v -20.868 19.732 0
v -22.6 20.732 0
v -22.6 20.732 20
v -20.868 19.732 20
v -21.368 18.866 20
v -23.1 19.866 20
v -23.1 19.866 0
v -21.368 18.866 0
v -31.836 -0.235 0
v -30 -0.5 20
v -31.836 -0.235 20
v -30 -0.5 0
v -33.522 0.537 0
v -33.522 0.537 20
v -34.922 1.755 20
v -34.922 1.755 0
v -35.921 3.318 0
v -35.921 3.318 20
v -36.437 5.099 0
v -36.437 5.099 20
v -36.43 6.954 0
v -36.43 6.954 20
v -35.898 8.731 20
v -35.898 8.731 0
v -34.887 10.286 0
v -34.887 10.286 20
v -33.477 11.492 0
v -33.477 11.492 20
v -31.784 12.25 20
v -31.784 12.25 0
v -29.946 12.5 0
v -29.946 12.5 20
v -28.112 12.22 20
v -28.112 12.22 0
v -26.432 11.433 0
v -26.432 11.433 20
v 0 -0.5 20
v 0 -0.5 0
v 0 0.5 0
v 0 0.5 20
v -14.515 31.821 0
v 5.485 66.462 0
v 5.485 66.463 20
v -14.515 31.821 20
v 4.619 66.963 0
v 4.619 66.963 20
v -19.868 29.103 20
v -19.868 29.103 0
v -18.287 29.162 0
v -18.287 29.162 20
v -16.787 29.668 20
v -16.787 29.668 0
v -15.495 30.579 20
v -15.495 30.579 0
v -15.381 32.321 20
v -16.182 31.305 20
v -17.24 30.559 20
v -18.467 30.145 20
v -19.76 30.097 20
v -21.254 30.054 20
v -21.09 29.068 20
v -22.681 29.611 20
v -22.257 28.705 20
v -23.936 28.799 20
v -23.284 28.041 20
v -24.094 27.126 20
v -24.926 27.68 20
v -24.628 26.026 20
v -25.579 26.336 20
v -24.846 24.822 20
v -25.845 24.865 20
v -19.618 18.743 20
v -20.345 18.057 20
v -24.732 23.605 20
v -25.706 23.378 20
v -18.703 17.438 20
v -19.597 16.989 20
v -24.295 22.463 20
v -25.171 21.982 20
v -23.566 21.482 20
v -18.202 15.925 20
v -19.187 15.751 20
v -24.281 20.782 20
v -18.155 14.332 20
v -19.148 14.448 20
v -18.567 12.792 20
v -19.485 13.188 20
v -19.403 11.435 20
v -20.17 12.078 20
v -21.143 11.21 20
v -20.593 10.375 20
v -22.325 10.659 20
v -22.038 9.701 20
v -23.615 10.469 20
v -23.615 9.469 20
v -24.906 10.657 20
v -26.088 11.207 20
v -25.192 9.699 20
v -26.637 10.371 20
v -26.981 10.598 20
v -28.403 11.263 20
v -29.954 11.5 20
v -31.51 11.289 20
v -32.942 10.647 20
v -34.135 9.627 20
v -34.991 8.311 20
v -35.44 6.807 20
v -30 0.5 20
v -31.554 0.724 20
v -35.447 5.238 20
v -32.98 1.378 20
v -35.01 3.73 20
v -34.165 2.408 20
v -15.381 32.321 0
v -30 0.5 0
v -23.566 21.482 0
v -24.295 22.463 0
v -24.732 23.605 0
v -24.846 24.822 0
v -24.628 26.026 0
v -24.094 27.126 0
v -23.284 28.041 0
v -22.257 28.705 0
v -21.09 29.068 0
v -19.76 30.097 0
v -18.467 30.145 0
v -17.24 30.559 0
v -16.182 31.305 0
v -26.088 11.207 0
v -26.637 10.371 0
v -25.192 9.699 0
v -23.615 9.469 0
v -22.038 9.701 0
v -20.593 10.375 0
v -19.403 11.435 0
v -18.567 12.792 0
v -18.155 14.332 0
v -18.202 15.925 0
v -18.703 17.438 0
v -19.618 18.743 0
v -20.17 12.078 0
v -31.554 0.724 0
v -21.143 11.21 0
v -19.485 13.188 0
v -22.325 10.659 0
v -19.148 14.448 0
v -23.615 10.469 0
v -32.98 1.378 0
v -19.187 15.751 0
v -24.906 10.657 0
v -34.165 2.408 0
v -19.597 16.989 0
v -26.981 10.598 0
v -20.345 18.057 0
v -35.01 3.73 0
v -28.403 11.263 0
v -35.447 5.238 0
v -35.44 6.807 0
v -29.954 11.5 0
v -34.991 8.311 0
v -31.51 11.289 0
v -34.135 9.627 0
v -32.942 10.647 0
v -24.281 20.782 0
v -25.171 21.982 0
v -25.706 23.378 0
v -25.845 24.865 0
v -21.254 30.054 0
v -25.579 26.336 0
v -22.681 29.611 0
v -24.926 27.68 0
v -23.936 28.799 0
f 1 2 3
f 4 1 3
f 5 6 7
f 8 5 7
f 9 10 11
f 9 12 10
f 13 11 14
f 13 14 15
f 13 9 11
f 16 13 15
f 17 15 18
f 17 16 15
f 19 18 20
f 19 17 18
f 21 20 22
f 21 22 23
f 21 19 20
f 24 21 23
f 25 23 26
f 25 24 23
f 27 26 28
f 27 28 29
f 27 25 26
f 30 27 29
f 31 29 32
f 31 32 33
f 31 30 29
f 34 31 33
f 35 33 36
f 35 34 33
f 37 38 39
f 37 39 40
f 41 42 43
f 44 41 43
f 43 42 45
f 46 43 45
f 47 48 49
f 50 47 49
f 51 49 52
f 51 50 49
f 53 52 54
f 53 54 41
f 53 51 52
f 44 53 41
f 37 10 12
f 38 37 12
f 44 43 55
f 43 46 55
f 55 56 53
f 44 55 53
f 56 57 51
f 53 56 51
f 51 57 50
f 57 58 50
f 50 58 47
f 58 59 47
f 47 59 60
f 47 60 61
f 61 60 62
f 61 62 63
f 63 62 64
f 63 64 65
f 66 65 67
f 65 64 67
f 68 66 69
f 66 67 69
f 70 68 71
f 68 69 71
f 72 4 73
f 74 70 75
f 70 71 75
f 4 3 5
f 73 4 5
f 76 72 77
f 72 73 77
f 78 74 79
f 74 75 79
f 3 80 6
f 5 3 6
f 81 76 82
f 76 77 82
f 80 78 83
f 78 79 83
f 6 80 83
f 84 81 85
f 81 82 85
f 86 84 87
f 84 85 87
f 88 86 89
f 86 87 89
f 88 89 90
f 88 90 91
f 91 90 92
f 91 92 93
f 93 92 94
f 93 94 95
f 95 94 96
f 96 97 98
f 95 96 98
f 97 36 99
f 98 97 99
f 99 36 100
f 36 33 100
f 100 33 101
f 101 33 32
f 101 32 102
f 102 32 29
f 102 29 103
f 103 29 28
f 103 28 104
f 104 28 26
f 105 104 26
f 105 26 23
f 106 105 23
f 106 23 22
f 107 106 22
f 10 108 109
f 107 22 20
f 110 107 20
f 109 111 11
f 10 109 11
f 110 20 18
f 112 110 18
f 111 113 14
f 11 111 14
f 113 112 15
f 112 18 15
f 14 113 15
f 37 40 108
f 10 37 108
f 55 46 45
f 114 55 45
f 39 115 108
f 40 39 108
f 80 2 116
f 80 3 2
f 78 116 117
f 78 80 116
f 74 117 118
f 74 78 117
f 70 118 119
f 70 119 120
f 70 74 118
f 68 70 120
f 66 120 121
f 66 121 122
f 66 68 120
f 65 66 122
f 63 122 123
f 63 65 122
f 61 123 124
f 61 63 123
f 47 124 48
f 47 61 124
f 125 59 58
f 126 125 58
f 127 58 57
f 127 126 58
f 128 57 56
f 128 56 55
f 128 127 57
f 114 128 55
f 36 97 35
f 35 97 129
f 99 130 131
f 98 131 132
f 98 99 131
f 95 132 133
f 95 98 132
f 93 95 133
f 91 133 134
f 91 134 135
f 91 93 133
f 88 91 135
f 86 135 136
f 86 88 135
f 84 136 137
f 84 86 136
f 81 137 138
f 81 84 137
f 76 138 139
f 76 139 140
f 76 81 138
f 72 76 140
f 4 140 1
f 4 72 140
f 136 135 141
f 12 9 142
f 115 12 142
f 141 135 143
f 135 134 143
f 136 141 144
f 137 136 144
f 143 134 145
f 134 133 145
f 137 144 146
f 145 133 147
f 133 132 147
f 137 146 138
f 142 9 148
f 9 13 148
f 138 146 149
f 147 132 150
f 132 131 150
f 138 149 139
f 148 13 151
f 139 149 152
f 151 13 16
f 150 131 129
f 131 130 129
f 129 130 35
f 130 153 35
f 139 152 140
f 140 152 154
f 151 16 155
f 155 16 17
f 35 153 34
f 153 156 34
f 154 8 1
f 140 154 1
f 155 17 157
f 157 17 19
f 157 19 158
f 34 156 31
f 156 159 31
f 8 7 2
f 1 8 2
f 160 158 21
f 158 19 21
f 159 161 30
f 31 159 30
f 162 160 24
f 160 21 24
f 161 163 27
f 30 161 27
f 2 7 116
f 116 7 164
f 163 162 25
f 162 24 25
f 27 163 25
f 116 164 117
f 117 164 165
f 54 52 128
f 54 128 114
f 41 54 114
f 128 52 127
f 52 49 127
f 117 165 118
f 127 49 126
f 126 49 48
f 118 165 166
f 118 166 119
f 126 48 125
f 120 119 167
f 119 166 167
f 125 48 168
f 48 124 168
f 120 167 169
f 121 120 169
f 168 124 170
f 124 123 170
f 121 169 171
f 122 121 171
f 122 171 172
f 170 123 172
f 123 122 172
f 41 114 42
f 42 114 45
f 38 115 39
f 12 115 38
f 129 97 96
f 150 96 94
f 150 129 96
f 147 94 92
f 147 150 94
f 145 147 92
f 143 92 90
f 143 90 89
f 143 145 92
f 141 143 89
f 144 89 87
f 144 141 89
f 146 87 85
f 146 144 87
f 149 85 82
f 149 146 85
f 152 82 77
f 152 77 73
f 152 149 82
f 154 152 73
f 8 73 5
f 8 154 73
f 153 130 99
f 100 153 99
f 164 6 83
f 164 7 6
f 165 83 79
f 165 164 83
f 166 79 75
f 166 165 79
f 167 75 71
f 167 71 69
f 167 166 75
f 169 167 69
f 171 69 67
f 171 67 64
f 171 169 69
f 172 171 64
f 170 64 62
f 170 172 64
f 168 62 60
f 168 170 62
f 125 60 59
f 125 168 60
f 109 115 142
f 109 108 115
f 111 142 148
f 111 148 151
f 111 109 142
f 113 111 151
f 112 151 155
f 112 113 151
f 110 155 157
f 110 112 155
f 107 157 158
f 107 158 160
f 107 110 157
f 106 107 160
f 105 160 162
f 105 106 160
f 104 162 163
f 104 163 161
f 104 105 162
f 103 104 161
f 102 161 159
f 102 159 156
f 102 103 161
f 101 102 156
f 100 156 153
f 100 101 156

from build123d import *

# Parameters (mm, degrees)
SKETCH_W = 1
SKETCH_H = 20


with BuildPart() as part:
    # AdditivePipe: sweep along a path in Sketch001
    with BuildLine(Plane.XY) as additivepipe_path:
        Line((0, 0), (-30, 0))
        ThreePointArc((-30, 0), (-35.748611, 7.718568), (-26.706875, 11.015509))
        Line((-26.706875, 11.015509), (-26.362344, 10.789294))
        ThreePointArc((-26.362344, 10.789294), (-19.361462, 12.345669), (-21.118073, 19.299011))
        Line((-21.118073, 19.299011), (-22.850124, 20.299011))
        ThreePointArc((-22.850124, 20.299011), (-25.103298, 26.180698), (-19.81394, 29.600306))
        ThreePointArc((-19.81394, 29.600306), (-17.013872, 30.113353), (-14.947628, 32.071474))
        Line((-14.947628, 32.071474), (5.052372, 66.71249))
    # Sketch → AdditivePipe (sweep)
    with BuildSketch(Plane.YZ):
        with Locations((0, 10)):
            Rectangle(SKETCH_W, SKETCH_H)
    sweep(path=additivepipe_path.line)


solid = part.part
